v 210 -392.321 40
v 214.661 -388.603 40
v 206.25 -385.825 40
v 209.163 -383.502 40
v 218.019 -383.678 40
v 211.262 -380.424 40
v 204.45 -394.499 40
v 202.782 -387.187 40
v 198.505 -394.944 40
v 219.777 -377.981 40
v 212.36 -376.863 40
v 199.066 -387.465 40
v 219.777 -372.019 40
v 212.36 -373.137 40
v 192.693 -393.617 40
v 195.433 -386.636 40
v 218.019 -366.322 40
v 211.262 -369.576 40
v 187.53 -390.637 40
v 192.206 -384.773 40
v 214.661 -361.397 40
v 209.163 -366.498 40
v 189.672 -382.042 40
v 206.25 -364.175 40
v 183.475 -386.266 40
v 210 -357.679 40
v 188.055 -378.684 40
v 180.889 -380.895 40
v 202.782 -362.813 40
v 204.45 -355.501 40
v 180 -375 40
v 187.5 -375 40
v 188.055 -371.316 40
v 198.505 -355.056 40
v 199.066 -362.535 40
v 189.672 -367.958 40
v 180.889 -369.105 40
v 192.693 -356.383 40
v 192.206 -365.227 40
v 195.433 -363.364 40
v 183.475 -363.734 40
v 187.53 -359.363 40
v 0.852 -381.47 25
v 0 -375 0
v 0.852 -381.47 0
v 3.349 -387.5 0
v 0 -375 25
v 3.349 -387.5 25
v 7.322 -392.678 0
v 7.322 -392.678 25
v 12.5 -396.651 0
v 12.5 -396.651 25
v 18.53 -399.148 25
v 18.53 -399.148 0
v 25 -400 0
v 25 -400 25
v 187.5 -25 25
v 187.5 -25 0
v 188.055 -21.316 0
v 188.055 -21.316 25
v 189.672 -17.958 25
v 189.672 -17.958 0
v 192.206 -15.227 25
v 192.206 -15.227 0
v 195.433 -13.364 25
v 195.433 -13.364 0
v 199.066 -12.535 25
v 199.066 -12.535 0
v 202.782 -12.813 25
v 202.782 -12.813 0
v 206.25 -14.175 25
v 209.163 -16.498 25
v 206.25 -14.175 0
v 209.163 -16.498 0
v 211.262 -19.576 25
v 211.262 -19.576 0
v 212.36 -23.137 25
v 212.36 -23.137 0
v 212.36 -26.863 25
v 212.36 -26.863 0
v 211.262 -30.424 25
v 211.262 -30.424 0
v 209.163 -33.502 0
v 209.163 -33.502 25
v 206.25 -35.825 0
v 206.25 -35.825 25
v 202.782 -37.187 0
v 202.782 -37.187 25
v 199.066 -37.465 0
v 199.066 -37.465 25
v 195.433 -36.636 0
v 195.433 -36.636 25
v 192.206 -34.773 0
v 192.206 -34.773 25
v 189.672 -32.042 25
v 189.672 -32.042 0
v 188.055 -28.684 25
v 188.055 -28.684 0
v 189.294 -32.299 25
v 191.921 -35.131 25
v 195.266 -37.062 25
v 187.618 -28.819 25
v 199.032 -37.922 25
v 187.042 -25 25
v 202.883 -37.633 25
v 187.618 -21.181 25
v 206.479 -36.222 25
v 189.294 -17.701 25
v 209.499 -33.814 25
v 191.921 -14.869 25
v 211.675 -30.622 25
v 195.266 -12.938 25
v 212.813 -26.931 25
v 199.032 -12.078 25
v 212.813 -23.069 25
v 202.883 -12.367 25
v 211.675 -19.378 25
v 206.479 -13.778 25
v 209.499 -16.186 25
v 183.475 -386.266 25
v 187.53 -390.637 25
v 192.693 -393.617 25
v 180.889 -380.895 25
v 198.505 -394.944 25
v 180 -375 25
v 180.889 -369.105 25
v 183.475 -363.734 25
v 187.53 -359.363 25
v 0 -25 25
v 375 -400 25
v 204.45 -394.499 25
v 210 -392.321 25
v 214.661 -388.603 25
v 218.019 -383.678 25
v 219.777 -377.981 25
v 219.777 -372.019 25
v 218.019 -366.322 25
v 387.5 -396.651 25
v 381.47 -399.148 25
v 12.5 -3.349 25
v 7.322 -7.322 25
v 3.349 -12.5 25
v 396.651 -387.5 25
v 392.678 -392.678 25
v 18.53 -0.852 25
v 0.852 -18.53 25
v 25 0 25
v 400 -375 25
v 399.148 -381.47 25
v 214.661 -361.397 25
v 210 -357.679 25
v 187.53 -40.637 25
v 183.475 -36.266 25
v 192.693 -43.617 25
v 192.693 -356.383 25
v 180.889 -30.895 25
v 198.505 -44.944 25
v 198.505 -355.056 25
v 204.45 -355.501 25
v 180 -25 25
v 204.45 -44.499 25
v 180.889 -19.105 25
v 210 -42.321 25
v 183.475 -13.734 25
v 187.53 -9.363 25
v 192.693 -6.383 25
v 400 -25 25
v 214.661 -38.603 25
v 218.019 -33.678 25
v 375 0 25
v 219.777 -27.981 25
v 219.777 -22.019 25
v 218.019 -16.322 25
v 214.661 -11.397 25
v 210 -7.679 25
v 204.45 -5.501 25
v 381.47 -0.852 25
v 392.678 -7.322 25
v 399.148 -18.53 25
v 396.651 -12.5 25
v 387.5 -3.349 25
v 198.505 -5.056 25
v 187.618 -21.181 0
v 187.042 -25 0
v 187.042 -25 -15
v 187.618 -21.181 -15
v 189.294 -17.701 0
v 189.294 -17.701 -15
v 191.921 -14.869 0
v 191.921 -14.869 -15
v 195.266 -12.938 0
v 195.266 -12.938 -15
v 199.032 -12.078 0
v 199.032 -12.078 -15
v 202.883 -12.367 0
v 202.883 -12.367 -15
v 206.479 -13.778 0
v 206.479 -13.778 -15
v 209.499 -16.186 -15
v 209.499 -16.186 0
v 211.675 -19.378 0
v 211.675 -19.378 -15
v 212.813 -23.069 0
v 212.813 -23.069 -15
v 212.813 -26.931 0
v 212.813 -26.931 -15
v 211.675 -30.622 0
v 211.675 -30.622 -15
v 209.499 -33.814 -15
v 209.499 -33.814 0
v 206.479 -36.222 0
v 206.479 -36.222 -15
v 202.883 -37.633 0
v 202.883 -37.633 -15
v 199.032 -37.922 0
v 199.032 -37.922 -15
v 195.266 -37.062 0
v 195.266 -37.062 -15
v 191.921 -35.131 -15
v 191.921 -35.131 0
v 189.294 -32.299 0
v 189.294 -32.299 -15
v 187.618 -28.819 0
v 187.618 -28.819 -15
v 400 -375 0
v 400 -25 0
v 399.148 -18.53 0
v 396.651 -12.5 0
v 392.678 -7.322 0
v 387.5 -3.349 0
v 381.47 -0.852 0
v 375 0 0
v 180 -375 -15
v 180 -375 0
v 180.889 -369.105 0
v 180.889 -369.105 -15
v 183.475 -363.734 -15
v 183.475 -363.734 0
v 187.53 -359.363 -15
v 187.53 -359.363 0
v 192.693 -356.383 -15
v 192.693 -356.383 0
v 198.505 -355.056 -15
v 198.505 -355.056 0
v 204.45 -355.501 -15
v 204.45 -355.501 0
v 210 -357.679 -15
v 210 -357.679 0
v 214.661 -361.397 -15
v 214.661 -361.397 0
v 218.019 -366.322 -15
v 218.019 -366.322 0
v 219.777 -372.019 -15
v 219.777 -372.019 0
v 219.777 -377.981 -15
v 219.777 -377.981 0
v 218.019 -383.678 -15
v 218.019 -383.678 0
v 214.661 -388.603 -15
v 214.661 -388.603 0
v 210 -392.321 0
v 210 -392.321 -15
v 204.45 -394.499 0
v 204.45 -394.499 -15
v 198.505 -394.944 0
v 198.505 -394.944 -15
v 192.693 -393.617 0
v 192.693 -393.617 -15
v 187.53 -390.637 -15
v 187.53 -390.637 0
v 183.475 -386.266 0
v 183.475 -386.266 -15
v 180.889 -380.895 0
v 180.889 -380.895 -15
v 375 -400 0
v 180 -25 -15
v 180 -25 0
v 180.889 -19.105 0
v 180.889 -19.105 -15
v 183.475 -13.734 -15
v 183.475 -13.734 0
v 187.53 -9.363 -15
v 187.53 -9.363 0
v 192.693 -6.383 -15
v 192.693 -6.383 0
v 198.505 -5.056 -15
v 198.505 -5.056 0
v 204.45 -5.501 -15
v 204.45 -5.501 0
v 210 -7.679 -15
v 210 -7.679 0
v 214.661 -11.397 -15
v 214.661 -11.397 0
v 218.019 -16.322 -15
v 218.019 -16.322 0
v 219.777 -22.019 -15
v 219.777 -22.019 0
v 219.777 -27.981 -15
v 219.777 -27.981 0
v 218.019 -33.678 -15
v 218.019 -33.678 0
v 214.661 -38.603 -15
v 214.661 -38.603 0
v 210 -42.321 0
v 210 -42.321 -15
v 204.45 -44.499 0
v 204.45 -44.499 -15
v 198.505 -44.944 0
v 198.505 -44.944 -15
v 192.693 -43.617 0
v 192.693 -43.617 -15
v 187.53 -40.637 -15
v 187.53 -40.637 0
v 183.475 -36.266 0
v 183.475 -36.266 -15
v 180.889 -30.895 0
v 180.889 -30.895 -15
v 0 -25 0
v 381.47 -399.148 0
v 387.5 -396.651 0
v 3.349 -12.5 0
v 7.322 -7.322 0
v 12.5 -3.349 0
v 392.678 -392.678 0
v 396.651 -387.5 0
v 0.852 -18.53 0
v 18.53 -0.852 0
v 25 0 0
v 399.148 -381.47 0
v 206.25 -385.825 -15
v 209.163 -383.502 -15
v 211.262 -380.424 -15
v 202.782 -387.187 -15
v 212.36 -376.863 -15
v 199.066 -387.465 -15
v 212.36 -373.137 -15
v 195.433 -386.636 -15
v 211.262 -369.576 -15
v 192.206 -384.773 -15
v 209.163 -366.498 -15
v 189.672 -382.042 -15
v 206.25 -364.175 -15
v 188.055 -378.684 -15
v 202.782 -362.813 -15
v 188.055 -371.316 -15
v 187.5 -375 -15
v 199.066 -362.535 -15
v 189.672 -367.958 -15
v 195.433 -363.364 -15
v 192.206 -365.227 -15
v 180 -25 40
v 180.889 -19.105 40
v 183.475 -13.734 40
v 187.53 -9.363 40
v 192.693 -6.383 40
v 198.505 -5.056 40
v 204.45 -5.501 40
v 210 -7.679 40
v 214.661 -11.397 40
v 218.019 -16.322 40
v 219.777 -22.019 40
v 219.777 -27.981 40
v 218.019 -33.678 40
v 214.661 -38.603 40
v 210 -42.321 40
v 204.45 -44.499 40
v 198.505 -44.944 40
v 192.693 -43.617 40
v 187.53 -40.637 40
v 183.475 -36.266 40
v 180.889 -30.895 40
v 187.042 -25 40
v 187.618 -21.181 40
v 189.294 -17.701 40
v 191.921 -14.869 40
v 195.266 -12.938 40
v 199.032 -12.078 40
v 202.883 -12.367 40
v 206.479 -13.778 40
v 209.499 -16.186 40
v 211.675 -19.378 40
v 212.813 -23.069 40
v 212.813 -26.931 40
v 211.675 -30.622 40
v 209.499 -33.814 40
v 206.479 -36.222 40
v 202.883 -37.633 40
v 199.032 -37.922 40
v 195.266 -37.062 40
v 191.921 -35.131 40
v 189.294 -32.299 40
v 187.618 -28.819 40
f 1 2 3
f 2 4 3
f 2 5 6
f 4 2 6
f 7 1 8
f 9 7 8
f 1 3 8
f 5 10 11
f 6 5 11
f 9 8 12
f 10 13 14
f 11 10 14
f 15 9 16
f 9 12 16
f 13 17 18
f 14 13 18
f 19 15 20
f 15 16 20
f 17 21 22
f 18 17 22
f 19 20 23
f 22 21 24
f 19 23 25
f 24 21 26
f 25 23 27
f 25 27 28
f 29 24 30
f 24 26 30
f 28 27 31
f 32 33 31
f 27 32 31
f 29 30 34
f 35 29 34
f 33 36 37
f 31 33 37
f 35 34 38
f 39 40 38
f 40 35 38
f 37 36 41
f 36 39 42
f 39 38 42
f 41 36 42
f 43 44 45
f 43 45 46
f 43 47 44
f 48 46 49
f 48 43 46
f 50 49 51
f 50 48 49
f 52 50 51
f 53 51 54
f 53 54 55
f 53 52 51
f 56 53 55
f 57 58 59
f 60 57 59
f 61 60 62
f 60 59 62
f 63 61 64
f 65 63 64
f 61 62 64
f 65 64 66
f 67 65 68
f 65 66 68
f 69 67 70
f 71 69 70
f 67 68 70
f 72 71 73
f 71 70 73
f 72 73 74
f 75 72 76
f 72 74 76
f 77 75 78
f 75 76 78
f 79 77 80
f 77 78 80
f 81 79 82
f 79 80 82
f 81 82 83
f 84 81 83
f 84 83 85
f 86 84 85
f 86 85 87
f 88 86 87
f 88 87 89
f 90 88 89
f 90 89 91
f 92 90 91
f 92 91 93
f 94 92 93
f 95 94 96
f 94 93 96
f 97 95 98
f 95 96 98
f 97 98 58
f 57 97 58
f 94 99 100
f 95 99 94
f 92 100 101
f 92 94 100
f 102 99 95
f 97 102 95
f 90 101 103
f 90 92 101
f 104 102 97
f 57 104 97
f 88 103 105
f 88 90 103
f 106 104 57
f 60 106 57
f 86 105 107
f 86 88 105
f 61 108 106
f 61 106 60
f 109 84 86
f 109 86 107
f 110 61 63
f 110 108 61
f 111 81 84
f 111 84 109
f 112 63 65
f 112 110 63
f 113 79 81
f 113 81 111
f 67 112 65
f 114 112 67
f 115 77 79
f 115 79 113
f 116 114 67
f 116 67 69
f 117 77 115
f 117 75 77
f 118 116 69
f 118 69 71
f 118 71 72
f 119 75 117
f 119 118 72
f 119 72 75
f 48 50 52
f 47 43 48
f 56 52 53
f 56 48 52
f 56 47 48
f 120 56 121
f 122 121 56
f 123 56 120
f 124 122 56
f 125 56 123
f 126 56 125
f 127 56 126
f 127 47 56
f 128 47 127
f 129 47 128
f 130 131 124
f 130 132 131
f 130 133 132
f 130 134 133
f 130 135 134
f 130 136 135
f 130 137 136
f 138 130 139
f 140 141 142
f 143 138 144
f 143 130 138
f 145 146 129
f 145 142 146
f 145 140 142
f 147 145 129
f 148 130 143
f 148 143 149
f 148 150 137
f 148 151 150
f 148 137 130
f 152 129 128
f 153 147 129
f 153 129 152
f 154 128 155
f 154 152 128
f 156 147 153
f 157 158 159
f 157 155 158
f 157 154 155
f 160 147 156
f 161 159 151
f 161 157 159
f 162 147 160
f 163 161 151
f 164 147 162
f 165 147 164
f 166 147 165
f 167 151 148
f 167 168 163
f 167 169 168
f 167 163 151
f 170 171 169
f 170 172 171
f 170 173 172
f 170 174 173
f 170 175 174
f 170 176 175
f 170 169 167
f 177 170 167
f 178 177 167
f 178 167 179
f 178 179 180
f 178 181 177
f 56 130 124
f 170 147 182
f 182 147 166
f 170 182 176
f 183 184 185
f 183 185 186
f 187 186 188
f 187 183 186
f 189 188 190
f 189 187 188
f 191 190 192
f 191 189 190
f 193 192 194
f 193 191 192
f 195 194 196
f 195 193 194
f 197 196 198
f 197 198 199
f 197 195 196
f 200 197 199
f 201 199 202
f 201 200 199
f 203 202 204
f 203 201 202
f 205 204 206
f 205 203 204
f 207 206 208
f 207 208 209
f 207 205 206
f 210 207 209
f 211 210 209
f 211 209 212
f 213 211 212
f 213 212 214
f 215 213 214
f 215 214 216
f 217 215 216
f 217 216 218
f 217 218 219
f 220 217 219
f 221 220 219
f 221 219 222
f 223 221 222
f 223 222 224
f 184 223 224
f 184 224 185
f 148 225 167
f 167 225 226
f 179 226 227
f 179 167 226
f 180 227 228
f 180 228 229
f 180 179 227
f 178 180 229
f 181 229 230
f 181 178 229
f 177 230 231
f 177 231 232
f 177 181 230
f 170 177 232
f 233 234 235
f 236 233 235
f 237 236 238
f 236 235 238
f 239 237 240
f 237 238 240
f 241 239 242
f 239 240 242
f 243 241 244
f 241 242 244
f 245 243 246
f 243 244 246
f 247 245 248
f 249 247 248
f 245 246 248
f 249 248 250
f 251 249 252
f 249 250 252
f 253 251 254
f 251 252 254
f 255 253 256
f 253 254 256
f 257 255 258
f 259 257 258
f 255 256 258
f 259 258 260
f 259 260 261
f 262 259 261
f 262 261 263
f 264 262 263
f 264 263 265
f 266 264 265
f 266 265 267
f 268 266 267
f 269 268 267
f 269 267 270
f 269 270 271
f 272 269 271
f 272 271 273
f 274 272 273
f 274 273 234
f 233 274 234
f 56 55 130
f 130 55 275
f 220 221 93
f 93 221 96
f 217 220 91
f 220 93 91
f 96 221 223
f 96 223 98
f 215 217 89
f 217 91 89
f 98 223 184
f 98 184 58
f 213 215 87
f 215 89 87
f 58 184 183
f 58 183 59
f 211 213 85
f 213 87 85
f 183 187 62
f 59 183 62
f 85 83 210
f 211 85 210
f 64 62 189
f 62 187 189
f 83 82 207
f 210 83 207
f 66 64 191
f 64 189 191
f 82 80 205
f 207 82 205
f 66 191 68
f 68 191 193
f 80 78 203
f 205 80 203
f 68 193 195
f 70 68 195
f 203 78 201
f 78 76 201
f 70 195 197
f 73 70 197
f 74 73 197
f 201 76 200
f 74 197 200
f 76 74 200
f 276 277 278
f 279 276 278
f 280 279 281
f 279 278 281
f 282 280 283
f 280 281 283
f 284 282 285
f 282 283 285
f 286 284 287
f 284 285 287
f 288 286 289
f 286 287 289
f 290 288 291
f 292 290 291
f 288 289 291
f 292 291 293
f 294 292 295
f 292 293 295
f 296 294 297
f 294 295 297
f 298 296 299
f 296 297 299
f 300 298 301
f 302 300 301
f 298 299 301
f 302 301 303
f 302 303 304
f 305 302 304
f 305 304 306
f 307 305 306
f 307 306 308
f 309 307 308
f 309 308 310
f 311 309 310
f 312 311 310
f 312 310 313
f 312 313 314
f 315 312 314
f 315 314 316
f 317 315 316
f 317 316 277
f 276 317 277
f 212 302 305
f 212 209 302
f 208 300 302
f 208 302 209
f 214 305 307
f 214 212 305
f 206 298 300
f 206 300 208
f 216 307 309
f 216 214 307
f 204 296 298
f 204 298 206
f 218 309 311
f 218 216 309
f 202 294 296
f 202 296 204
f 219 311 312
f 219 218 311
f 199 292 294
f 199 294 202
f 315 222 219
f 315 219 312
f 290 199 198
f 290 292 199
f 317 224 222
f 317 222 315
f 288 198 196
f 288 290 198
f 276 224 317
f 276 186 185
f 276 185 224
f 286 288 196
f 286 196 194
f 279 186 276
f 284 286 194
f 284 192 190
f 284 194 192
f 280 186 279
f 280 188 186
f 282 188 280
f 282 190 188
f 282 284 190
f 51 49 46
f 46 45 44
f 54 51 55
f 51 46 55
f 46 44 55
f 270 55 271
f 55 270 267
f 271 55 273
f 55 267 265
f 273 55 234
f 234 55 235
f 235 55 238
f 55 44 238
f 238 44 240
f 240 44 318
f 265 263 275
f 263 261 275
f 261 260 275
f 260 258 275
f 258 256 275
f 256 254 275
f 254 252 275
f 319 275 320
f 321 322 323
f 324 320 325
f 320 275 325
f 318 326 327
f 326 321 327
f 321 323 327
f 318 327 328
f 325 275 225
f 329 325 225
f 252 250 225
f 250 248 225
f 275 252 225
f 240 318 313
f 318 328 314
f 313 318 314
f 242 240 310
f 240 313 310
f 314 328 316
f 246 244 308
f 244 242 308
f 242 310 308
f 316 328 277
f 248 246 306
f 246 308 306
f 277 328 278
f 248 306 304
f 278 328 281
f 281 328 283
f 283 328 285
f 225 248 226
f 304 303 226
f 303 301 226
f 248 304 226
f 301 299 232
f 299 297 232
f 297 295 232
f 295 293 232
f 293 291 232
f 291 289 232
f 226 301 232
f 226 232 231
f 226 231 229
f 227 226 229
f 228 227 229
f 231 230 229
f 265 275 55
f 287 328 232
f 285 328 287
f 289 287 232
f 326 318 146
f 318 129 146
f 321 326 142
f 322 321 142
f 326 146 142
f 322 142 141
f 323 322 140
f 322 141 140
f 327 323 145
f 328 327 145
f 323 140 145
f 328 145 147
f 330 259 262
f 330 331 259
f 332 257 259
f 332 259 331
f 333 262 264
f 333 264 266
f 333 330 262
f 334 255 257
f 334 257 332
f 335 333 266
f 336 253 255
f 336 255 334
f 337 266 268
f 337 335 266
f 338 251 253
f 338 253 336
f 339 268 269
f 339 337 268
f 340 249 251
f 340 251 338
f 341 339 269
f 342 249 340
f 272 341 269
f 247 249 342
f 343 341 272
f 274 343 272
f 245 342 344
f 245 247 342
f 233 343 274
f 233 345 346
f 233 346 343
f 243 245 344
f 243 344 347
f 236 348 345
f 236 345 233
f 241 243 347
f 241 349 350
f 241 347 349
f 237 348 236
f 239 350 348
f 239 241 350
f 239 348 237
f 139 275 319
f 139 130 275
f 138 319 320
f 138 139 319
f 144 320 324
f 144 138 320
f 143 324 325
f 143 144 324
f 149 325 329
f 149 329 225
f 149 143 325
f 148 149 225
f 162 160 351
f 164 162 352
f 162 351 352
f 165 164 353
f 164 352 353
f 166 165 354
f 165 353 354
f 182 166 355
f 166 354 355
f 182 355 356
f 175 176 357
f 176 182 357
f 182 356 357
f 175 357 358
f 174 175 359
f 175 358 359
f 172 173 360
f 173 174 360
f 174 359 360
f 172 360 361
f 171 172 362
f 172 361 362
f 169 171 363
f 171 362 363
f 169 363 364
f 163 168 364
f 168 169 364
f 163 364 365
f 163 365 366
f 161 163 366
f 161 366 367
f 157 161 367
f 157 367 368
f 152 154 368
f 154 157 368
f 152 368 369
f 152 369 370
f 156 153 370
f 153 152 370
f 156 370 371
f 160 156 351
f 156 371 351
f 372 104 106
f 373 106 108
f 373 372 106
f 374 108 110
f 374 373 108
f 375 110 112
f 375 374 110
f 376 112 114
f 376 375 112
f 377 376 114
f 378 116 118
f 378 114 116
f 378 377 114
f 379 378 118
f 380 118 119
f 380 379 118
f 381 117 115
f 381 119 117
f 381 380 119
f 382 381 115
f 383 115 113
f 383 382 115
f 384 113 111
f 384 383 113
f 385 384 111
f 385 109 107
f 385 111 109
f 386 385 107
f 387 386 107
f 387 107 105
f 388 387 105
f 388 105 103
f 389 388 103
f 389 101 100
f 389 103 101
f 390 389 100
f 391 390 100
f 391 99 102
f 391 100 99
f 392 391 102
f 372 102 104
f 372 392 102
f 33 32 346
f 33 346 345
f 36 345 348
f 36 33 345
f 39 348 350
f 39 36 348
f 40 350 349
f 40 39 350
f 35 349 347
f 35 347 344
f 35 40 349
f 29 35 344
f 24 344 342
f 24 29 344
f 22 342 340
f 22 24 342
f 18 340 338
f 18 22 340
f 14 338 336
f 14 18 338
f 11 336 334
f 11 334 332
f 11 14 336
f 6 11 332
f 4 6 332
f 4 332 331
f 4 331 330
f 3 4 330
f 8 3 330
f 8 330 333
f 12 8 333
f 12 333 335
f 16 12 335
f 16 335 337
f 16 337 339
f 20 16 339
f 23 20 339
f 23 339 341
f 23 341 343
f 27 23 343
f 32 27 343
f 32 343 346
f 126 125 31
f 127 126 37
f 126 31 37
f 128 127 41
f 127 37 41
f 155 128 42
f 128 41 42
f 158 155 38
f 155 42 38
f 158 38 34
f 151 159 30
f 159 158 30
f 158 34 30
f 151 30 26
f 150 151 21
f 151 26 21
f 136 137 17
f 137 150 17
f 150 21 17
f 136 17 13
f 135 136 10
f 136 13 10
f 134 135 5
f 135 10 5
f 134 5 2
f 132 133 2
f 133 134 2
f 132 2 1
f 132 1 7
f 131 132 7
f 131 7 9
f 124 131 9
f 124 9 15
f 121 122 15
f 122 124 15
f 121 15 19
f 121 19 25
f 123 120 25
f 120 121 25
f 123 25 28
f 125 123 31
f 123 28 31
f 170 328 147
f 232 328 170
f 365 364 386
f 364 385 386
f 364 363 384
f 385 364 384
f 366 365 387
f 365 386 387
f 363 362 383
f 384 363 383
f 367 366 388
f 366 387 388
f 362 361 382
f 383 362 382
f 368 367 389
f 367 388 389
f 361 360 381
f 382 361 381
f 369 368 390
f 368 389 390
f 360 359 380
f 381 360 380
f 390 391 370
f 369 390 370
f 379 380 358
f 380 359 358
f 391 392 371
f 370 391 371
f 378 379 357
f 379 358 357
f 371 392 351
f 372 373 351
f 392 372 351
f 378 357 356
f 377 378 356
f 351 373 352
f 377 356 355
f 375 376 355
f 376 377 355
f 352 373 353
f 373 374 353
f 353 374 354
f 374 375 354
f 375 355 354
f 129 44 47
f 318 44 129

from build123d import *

# Parameters (mm, degrees)
SKETCH1_W                = 400
SKETCH1_H                = 400
BOSS_EXTRUDE1_DEPTH      = 25
FILLET1_R                = 25
SKETCH2_R                = 12.5
CUT_EXTRUDE1_DEPTH       = 25
BOSS_EXTRUDE2_DEPTH      = 15
BOSS_EXTRUDE2_DEPTH_BACK = 40
SKETCH3_R                = 20
SKETCH3_R_2              = 12.957739805
SKETCH3_R_3              = 12.5


with BuildPart() as part:
    # Sketch1 → Boss-Extrude1 (new body)
    with BuildSketch(Plane.XY):
        with Locations((200, -200)):
            Rectangle(SKETCH1_W, SKETCH1_H)
    extrude(amount=BOSS_EXTRUDE1_DEPTH)

    # Fillet1
    fillet1_edges = [part.edges().sort_by_distance(p)[0] for p in [
        (0, 0, 12.5),
        (400, 0, 12.5),
        (400, -400, 12.5),
        (0, -400, 12.5),
    ]]
    fillet(fillet1_edges, radius=FILLET1_R)

    # Sketch2 → Cut-Extrude1 (cut)
    with BuildSketch(Plane(origin=(0, 0, 0), x_dir=(-1, 0, 0), z_dir=(0, 0, -1))):
        with Locations((-200, -25)):
            Circle(SKETCH2_R)
        with Locations((-200, -375)):
            Circle(SKETCH2_R)
    extrude(amount=-CUT_EXTRUDE1_DEPTH, mode=Mode.SUBTRACT)

    # Sketch3 → Boss-Extrude2 (add, two sides: drawn at the far end of the back side and taken through both)
    # profile 1 of 2: a face of its own
    with BuildSketch(Plane(origin=(0, 0, 0), x_dir=(-1, 0, 0), z_dir=(0, 0, -1)).offset(-BOSS_EXTRUDE2_DEPTH_BACK)):
        with Locations((-200, -25)):
            Circle(SKETCH3_R)
        with Locations((-200, -25)):
            Circle(SKETCH3_R_2, mode=Mode.SUBTRACT)
    # profile 2 of 2: a face of its own
    with BuildSketch(Plane(origin=(0, 0, 0), x_dir=(-1, 0, 0), z_dir=(0, 0, -1)).offset(-BOSS_EXTRUDE2_DEPTH_BACK)):
        with Locations((-200, -375)):
            Circle(SKETCH3_R)
        with Locations((-200, -375)):
            Circle(SKETCH3_R_3, mode=Mode.SUBTRACT)
    extrude(amount=BOSS_EXTRUDE2_DEPTH + BOSS_EXTRUDE2_DEPTH_BACK)


solid = part.part
